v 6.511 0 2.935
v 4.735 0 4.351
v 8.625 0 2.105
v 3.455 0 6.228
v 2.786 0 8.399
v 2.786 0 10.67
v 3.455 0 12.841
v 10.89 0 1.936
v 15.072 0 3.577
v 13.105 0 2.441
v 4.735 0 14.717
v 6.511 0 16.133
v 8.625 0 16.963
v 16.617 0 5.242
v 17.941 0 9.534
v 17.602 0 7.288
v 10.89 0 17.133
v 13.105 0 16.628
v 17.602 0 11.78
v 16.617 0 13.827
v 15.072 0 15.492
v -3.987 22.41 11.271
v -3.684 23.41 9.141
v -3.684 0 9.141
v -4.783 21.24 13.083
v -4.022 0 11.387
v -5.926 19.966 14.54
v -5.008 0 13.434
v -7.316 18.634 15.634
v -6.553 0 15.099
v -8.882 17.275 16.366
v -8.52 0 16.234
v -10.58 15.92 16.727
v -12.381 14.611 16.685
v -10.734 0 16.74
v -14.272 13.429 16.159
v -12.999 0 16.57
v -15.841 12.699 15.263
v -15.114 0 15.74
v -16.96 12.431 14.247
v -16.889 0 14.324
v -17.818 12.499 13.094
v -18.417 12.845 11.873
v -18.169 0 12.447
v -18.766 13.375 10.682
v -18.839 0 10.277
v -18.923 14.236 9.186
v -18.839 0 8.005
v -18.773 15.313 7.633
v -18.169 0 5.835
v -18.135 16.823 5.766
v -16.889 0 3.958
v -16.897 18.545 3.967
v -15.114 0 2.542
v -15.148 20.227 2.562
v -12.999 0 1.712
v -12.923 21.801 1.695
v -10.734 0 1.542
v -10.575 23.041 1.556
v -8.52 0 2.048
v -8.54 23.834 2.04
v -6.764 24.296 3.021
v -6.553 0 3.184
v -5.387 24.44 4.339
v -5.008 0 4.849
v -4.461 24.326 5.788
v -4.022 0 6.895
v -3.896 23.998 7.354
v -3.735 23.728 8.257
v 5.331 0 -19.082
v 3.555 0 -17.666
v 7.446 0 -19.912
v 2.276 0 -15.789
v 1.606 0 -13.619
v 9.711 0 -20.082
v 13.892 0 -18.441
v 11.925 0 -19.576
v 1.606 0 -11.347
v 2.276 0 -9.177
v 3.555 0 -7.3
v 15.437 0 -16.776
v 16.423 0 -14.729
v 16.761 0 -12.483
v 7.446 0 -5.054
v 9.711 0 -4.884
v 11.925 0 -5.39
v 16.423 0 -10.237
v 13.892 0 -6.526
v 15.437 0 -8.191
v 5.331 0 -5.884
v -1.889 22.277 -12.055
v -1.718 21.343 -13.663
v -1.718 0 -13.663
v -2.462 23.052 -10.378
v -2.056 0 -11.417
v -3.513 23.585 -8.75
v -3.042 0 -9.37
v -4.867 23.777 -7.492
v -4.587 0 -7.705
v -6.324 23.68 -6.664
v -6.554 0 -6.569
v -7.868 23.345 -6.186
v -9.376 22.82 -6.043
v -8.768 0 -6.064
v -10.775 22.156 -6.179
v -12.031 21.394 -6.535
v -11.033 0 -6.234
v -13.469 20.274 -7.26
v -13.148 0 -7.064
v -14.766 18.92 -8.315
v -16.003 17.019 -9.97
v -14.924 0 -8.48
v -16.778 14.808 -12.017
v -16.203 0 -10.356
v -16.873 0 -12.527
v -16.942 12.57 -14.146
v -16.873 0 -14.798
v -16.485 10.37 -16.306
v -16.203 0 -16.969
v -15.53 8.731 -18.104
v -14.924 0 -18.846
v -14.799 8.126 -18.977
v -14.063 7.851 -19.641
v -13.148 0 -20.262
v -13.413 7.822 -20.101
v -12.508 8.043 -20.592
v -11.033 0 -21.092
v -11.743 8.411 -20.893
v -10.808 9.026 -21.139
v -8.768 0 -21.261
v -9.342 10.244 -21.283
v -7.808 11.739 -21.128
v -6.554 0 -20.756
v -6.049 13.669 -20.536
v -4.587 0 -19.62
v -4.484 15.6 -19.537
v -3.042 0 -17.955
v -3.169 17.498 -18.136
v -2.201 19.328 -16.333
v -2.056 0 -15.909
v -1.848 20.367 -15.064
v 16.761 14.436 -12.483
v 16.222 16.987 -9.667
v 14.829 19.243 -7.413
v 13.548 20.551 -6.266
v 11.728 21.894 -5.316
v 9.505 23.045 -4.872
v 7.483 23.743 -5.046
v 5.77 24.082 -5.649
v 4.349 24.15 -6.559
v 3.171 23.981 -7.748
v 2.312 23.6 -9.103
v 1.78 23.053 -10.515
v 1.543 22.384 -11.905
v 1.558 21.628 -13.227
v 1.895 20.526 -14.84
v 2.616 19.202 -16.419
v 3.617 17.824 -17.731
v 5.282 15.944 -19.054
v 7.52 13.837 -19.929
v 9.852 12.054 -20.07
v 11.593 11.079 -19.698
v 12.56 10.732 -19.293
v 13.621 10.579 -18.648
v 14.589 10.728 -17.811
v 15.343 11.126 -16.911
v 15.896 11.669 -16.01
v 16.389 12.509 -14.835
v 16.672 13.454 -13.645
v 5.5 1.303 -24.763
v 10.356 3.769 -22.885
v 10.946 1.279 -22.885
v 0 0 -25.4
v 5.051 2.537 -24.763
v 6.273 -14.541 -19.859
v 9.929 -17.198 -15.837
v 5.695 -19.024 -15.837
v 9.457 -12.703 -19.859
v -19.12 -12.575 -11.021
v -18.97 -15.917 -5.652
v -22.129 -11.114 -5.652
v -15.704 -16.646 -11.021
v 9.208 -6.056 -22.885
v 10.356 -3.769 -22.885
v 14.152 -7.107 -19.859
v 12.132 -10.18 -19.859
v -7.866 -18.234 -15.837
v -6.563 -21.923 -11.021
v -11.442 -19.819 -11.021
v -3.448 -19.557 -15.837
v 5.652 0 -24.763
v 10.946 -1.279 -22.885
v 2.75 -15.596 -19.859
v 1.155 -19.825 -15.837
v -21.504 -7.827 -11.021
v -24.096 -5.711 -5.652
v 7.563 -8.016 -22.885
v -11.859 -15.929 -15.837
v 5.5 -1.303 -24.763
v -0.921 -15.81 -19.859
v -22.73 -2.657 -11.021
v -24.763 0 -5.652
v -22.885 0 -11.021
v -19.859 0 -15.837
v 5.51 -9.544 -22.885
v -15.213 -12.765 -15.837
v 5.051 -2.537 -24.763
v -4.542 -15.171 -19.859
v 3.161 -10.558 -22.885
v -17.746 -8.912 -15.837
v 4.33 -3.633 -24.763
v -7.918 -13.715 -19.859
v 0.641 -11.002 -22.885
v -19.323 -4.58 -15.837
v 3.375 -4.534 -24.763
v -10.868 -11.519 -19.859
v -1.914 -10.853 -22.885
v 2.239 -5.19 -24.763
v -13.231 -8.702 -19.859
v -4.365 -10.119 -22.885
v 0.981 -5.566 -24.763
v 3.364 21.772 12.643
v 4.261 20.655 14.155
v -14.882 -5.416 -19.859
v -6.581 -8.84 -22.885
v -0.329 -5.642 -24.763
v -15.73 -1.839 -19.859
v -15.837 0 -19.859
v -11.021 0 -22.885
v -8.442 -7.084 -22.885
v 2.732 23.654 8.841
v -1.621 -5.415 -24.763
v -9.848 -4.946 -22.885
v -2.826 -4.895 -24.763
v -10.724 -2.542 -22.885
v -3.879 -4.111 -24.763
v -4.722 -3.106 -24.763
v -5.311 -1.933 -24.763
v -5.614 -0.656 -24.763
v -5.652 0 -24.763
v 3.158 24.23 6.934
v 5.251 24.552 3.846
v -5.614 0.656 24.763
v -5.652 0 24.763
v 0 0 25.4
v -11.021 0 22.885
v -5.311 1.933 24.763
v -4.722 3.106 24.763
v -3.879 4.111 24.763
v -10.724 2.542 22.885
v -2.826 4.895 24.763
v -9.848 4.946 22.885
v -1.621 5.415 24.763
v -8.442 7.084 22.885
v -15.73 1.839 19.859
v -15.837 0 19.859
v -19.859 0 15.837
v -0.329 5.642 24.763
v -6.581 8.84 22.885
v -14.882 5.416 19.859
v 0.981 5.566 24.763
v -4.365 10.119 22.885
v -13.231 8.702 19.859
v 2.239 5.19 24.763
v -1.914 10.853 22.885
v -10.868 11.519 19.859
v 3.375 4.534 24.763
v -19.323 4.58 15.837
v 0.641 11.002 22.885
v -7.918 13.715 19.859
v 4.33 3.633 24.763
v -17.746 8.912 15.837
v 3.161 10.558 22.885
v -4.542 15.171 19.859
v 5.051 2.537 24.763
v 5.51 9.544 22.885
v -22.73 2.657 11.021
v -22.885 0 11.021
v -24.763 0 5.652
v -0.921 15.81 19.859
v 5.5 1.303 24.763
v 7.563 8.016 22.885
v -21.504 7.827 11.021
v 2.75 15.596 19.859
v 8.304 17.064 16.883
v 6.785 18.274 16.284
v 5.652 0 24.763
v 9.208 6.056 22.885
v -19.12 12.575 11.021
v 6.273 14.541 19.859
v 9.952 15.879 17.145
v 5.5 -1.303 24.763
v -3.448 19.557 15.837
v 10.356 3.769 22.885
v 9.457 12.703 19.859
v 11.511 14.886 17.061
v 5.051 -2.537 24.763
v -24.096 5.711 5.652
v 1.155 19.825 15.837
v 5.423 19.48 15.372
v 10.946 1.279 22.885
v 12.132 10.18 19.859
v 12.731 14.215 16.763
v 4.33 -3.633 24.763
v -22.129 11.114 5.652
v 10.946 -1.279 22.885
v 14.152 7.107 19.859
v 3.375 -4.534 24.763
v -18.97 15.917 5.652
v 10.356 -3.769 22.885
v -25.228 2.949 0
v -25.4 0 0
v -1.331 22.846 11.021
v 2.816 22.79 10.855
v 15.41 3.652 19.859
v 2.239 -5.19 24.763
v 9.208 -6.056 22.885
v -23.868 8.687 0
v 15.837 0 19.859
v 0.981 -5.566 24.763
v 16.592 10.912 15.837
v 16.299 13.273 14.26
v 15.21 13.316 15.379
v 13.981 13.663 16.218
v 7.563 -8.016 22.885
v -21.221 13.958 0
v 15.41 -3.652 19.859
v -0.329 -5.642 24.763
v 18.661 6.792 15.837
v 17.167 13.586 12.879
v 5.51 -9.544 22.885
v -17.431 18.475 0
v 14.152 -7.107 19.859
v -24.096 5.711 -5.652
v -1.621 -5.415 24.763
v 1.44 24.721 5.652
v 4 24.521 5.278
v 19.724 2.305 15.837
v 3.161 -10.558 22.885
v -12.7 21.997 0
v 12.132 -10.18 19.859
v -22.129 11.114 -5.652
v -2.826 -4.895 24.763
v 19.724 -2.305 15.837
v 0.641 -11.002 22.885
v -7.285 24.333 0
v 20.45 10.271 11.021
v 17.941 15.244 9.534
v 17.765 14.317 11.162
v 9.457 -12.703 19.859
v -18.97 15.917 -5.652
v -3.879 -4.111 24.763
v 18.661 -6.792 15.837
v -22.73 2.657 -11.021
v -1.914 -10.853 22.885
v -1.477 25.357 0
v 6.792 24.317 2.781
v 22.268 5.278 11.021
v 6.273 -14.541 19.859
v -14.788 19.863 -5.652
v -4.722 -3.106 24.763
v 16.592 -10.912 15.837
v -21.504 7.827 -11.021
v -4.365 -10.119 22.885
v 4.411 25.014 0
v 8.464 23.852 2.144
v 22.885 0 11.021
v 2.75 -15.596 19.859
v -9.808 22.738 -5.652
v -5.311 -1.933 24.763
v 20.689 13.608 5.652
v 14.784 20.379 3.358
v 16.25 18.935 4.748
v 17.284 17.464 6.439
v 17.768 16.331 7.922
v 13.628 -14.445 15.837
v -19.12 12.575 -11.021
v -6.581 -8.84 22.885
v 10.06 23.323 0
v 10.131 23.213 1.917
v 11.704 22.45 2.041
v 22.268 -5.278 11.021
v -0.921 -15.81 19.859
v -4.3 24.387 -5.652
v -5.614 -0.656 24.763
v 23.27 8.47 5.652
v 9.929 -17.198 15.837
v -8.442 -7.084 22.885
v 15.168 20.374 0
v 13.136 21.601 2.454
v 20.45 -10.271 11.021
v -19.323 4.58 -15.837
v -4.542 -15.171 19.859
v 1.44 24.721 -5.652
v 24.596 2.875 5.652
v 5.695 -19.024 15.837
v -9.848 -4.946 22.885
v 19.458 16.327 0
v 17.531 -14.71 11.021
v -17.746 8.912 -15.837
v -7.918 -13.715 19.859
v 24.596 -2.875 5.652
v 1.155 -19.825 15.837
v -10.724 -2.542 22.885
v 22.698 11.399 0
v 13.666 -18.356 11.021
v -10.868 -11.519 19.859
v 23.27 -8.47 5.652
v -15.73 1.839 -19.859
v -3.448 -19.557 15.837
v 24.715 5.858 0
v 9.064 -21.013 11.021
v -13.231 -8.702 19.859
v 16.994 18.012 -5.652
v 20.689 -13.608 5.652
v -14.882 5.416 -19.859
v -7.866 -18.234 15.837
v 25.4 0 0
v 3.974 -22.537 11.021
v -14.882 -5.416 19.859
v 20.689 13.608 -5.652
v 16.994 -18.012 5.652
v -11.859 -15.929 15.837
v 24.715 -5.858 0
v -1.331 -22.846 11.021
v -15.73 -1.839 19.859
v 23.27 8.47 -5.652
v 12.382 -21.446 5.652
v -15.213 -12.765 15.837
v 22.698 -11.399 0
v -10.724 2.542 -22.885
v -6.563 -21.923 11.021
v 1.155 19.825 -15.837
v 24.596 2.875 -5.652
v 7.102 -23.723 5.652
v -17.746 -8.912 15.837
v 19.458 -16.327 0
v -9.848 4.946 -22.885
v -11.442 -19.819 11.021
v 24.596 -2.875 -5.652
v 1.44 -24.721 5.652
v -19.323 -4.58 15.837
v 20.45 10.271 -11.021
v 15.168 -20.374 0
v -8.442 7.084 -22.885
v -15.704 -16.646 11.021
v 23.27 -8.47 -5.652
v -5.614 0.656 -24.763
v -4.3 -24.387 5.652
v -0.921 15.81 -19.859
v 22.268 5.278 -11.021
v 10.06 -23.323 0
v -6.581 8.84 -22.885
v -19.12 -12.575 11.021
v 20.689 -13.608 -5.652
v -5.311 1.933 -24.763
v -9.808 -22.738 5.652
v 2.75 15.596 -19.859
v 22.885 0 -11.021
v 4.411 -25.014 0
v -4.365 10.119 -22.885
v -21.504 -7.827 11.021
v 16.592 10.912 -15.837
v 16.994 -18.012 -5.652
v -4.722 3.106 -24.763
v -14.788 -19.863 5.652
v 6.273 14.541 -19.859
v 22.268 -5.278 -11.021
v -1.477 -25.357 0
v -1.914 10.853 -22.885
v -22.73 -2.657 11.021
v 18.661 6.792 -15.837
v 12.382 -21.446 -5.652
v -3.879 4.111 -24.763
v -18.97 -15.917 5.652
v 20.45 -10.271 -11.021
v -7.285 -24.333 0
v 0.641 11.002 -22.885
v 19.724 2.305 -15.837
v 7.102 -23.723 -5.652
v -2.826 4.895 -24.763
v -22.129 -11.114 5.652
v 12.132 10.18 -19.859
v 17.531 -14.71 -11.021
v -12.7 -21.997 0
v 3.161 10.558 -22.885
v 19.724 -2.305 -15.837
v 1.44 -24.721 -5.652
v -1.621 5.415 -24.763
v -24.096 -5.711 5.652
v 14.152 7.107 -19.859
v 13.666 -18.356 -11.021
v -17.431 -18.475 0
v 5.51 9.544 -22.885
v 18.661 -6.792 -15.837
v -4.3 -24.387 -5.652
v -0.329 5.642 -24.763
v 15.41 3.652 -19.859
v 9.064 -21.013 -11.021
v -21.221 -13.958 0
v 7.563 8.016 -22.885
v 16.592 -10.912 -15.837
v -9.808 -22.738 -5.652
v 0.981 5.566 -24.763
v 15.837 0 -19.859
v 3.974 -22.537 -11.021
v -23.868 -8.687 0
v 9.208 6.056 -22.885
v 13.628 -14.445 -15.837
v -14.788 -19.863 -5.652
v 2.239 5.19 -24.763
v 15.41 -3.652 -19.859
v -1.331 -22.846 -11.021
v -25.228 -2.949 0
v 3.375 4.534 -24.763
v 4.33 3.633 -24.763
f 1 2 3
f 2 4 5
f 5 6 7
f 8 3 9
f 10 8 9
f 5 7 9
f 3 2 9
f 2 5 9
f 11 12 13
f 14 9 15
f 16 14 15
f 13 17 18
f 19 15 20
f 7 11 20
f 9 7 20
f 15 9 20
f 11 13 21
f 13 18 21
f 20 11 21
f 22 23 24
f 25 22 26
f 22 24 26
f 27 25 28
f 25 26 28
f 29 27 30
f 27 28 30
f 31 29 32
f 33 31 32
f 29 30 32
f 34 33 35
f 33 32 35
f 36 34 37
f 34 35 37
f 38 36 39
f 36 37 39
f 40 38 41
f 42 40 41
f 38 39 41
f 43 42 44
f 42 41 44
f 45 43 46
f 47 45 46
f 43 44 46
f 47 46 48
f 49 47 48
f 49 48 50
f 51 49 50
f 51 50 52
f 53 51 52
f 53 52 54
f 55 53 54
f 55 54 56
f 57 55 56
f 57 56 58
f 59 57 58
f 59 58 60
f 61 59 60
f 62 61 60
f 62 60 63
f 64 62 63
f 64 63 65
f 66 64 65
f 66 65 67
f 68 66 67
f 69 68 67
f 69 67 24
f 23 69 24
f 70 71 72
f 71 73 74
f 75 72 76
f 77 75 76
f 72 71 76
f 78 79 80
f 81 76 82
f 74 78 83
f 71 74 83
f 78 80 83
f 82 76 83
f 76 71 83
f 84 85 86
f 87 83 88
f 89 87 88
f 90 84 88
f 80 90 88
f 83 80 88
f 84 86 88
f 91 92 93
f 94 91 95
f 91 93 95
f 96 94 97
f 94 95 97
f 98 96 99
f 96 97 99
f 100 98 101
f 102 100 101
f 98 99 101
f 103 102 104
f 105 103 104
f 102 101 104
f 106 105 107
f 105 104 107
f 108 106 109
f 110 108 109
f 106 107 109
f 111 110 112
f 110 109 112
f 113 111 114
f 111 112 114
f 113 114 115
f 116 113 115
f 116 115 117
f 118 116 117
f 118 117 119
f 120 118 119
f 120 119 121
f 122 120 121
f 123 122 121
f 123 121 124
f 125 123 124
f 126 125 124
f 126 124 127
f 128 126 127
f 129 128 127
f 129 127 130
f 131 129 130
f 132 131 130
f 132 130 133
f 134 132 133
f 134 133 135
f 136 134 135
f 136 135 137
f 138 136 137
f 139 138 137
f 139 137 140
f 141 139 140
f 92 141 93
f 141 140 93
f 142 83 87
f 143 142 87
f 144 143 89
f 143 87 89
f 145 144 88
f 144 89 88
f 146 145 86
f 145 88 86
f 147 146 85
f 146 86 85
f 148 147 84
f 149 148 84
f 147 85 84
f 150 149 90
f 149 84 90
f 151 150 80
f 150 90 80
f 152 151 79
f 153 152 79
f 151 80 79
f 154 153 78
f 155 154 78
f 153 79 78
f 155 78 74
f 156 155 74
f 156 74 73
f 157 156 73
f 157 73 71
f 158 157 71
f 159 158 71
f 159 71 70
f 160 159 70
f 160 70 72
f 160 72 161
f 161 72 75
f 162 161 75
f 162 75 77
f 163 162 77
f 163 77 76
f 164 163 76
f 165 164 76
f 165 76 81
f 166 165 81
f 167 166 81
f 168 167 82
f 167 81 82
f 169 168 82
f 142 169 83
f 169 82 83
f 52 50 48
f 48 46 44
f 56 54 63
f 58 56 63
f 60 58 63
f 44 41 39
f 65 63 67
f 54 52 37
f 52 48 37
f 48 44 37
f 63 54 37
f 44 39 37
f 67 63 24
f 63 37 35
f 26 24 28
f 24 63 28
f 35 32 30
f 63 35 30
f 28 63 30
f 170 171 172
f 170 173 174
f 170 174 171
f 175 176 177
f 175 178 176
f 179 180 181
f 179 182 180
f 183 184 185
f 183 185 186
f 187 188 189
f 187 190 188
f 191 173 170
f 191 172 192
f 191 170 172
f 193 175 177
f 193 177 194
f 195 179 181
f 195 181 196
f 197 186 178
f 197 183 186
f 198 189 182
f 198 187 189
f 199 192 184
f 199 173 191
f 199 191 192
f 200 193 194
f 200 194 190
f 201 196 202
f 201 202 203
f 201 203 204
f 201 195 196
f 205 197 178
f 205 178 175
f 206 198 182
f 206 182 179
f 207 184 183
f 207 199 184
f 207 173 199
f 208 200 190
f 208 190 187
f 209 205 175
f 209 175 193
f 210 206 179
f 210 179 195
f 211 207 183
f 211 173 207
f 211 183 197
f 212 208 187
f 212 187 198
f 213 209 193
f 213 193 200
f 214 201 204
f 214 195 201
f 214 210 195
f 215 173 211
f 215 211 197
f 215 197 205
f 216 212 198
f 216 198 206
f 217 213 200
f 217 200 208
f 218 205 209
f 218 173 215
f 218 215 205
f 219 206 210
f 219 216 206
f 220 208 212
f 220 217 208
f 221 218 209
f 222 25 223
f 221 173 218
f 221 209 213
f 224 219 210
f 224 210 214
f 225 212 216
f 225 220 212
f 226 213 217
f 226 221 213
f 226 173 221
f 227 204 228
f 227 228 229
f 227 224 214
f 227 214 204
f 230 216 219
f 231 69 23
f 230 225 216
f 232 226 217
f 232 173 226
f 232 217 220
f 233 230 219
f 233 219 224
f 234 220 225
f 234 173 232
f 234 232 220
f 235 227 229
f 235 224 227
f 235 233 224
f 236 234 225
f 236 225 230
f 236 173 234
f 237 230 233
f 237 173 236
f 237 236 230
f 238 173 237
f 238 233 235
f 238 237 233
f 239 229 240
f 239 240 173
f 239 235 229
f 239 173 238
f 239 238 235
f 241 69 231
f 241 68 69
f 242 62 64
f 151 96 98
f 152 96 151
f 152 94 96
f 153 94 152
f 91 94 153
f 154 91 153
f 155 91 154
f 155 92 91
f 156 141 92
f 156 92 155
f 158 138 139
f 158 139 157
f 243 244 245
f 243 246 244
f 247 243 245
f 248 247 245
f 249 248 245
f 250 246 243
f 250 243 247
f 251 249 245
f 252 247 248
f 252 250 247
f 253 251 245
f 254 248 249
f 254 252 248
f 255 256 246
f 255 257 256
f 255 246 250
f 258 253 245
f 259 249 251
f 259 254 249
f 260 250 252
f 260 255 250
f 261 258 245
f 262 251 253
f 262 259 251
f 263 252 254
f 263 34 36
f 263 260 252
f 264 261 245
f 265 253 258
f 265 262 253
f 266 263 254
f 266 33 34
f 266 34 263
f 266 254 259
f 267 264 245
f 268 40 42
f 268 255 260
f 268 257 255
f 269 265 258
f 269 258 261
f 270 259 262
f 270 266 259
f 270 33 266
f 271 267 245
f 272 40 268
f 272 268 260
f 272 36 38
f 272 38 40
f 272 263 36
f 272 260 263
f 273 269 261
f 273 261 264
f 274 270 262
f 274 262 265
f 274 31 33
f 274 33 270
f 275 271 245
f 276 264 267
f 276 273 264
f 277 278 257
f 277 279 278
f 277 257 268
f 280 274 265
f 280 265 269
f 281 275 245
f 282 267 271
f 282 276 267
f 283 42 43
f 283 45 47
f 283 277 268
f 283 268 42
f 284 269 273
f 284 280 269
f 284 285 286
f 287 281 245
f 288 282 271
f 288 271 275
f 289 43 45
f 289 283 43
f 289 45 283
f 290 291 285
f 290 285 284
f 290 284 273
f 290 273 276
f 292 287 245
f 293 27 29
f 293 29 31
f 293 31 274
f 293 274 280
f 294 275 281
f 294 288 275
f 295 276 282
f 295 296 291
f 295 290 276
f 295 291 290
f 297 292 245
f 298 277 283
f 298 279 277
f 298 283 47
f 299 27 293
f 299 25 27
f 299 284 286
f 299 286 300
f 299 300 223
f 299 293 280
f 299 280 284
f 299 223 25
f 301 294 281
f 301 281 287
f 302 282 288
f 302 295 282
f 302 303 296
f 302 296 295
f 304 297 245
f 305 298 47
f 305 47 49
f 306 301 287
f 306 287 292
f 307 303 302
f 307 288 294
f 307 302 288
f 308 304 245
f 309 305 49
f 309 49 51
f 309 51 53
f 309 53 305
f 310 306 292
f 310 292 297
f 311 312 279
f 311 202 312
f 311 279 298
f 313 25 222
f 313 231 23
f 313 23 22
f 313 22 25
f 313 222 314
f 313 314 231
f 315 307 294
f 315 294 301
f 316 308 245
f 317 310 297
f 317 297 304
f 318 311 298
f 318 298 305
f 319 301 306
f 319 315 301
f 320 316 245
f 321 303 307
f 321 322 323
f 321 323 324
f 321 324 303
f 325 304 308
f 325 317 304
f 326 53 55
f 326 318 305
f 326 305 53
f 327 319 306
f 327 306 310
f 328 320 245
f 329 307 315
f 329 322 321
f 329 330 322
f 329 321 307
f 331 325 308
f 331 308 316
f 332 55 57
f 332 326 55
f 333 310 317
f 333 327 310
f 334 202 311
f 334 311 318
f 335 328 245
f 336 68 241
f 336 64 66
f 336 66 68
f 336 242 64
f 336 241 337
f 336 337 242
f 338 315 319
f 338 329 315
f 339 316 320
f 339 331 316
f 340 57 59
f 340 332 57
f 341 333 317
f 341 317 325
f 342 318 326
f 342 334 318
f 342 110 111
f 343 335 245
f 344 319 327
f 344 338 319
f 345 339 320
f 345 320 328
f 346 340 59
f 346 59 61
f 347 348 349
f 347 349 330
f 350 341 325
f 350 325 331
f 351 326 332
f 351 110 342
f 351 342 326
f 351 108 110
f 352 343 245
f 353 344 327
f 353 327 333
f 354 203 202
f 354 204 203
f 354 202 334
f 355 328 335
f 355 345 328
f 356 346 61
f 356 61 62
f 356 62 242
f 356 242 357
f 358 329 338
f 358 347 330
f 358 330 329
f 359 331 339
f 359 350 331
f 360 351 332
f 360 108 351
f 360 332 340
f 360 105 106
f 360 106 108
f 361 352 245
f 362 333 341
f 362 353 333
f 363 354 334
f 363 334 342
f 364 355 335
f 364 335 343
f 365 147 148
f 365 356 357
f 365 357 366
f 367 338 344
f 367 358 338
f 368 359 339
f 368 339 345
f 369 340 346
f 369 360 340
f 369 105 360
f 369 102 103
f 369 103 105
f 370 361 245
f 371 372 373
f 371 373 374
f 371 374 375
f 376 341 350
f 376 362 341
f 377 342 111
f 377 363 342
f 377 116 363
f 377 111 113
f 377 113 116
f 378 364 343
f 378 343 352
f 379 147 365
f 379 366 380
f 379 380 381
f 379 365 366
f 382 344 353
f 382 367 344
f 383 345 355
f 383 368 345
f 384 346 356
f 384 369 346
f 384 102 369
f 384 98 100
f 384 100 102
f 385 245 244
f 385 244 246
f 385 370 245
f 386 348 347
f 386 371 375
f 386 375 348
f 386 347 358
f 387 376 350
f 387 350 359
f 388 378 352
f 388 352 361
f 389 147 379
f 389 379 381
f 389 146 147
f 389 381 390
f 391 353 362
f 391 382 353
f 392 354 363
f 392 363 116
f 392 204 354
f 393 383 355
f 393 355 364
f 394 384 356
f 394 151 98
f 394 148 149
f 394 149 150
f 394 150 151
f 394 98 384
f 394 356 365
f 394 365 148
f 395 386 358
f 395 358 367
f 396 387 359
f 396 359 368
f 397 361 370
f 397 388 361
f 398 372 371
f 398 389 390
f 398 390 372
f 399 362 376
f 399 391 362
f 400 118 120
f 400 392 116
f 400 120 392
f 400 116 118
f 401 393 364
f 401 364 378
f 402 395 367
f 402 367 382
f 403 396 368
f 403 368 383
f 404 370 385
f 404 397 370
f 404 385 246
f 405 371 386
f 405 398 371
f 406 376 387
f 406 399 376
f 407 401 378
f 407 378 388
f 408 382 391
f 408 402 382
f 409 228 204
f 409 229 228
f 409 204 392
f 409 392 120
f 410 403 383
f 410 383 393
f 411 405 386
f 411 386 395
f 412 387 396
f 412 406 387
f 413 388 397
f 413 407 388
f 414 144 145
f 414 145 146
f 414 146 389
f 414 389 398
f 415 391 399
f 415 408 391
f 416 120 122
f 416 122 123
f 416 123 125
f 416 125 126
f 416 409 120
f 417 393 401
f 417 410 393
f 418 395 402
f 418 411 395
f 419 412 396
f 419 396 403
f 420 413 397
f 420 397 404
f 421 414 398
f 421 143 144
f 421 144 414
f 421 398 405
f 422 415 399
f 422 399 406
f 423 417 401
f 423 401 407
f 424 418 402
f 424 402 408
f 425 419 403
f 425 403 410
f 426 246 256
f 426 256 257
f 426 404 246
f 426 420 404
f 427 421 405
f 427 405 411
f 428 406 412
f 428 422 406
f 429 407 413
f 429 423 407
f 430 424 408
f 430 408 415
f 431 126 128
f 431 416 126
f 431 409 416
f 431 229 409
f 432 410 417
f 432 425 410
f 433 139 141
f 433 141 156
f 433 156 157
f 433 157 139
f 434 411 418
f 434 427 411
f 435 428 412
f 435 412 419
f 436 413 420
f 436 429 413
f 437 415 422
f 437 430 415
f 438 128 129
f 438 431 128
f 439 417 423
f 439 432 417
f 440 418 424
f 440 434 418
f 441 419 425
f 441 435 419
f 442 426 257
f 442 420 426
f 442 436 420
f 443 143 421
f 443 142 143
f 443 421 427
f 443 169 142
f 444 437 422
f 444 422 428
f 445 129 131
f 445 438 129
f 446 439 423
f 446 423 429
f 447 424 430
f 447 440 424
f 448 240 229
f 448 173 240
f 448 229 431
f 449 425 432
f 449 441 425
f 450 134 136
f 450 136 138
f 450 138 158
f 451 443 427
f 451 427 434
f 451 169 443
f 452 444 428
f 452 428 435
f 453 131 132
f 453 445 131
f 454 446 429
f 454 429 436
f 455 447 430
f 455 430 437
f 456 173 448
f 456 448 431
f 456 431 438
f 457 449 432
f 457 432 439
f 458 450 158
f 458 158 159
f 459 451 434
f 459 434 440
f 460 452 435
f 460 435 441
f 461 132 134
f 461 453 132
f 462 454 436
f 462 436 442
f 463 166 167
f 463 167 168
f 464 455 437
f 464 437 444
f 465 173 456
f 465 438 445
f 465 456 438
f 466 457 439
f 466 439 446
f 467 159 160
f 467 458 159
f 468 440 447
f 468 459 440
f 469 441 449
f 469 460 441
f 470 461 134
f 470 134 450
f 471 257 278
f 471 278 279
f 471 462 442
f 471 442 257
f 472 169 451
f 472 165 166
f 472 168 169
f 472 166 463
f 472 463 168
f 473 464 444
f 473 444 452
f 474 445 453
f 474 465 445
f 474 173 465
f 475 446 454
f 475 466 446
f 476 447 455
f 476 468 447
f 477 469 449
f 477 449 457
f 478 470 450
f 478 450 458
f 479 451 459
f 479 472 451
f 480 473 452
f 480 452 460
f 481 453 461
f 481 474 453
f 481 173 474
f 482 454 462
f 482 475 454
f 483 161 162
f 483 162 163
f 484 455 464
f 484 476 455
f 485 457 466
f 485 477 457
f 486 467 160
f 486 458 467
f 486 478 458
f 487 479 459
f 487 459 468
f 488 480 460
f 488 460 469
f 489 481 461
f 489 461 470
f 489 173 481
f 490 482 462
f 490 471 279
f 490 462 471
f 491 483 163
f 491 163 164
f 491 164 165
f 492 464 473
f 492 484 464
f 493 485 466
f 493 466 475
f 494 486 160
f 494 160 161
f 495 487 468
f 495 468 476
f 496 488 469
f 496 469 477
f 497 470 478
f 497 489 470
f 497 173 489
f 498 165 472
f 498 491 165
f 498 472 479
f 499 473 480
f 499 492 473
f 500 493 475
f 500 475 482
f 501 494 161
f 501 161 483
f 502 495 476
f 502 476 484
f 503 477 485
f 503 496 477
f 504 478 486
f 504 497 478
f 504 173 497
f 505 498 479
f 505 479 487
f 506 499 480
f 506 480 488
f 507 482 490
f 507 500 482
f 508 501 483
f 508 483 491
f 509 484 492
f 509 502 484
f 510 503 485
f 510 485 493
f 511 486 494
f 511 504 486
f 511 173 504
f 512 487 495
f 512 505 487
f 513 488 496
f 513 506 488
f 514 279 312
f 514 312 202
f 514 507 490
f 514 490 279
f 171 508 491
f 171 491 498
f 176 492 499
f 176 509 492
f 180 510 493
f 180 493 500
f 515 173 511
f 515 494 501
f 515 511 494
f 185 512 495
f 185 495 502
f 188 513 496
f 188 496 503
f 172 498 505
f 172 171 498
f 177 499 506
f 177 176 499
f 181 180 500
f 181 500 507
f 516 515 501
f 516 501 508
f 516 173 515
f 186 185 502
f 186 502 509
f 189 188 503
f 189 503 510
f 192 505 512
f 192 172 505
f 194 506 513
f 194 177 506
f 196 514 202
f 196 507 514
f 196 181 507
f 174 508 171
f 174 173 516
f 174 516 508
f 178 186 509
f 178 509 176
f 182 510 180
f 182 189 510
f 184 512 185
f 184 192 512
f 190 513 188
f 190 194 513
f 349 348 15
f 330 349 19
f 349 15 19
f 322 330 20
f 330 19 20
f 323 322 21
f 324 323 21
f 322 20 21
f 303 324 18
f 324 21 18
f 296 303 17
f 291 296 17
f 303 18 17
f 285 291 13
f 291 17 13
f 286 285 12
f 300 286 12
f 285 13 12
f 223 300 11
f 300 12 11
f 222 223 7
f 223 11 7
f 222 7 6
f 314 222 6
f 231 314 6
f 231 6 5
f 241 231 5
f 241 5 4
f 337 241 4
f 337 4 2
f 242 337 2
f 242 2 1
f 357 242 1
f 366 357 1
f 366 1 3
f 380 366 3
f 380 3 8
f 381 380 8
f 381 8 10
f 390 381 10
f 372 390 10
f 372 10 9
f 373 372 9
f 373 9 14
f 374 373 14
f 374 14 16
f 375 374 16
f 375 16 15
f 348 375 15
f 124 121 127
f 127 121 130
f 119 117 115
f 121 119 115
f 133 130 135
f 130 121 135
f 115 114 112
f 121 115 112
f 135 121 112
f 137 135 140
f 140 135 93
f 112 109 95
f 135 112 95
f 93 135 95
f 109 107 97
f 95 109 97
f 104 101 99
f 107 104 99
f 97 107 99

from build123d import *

# Parameters (mm, degrees)
F2_R     = 7.62
F3_DEPTH = 76.2


with BuildPart() as f1:
    # F0 (on Front) → F1 (revolve)
    with BuildSketch(Plane.XZ):
        with BuildLine():
            Line((0, -25.4), (0, 25.4))
            ThreePointArc((0, 25.4), (-25.4, 0), (0, -25.4))
        make_face()
    revolve(axis=Axis((0, 0, 0), (0, 0, -1)))

    # F2 (on Front) → F3 (cut)
    with BuildSketch(Plane.XZ):
        with Locations((-11.303624, 9.141192)):
            Circle(F2_R)
        with Locations((10.320701, 9.534361)):
            Circle(F2_R)
        with Locations((9.141192, -12.483133)):
            Circle(F2_R)
        with Locations((-9.337776, -13.662642)):
            Circle(F2_R)
    extrude(amount=-F3_DEPTH, mode=Mode.SUBTRACT)


solid = f1.part
